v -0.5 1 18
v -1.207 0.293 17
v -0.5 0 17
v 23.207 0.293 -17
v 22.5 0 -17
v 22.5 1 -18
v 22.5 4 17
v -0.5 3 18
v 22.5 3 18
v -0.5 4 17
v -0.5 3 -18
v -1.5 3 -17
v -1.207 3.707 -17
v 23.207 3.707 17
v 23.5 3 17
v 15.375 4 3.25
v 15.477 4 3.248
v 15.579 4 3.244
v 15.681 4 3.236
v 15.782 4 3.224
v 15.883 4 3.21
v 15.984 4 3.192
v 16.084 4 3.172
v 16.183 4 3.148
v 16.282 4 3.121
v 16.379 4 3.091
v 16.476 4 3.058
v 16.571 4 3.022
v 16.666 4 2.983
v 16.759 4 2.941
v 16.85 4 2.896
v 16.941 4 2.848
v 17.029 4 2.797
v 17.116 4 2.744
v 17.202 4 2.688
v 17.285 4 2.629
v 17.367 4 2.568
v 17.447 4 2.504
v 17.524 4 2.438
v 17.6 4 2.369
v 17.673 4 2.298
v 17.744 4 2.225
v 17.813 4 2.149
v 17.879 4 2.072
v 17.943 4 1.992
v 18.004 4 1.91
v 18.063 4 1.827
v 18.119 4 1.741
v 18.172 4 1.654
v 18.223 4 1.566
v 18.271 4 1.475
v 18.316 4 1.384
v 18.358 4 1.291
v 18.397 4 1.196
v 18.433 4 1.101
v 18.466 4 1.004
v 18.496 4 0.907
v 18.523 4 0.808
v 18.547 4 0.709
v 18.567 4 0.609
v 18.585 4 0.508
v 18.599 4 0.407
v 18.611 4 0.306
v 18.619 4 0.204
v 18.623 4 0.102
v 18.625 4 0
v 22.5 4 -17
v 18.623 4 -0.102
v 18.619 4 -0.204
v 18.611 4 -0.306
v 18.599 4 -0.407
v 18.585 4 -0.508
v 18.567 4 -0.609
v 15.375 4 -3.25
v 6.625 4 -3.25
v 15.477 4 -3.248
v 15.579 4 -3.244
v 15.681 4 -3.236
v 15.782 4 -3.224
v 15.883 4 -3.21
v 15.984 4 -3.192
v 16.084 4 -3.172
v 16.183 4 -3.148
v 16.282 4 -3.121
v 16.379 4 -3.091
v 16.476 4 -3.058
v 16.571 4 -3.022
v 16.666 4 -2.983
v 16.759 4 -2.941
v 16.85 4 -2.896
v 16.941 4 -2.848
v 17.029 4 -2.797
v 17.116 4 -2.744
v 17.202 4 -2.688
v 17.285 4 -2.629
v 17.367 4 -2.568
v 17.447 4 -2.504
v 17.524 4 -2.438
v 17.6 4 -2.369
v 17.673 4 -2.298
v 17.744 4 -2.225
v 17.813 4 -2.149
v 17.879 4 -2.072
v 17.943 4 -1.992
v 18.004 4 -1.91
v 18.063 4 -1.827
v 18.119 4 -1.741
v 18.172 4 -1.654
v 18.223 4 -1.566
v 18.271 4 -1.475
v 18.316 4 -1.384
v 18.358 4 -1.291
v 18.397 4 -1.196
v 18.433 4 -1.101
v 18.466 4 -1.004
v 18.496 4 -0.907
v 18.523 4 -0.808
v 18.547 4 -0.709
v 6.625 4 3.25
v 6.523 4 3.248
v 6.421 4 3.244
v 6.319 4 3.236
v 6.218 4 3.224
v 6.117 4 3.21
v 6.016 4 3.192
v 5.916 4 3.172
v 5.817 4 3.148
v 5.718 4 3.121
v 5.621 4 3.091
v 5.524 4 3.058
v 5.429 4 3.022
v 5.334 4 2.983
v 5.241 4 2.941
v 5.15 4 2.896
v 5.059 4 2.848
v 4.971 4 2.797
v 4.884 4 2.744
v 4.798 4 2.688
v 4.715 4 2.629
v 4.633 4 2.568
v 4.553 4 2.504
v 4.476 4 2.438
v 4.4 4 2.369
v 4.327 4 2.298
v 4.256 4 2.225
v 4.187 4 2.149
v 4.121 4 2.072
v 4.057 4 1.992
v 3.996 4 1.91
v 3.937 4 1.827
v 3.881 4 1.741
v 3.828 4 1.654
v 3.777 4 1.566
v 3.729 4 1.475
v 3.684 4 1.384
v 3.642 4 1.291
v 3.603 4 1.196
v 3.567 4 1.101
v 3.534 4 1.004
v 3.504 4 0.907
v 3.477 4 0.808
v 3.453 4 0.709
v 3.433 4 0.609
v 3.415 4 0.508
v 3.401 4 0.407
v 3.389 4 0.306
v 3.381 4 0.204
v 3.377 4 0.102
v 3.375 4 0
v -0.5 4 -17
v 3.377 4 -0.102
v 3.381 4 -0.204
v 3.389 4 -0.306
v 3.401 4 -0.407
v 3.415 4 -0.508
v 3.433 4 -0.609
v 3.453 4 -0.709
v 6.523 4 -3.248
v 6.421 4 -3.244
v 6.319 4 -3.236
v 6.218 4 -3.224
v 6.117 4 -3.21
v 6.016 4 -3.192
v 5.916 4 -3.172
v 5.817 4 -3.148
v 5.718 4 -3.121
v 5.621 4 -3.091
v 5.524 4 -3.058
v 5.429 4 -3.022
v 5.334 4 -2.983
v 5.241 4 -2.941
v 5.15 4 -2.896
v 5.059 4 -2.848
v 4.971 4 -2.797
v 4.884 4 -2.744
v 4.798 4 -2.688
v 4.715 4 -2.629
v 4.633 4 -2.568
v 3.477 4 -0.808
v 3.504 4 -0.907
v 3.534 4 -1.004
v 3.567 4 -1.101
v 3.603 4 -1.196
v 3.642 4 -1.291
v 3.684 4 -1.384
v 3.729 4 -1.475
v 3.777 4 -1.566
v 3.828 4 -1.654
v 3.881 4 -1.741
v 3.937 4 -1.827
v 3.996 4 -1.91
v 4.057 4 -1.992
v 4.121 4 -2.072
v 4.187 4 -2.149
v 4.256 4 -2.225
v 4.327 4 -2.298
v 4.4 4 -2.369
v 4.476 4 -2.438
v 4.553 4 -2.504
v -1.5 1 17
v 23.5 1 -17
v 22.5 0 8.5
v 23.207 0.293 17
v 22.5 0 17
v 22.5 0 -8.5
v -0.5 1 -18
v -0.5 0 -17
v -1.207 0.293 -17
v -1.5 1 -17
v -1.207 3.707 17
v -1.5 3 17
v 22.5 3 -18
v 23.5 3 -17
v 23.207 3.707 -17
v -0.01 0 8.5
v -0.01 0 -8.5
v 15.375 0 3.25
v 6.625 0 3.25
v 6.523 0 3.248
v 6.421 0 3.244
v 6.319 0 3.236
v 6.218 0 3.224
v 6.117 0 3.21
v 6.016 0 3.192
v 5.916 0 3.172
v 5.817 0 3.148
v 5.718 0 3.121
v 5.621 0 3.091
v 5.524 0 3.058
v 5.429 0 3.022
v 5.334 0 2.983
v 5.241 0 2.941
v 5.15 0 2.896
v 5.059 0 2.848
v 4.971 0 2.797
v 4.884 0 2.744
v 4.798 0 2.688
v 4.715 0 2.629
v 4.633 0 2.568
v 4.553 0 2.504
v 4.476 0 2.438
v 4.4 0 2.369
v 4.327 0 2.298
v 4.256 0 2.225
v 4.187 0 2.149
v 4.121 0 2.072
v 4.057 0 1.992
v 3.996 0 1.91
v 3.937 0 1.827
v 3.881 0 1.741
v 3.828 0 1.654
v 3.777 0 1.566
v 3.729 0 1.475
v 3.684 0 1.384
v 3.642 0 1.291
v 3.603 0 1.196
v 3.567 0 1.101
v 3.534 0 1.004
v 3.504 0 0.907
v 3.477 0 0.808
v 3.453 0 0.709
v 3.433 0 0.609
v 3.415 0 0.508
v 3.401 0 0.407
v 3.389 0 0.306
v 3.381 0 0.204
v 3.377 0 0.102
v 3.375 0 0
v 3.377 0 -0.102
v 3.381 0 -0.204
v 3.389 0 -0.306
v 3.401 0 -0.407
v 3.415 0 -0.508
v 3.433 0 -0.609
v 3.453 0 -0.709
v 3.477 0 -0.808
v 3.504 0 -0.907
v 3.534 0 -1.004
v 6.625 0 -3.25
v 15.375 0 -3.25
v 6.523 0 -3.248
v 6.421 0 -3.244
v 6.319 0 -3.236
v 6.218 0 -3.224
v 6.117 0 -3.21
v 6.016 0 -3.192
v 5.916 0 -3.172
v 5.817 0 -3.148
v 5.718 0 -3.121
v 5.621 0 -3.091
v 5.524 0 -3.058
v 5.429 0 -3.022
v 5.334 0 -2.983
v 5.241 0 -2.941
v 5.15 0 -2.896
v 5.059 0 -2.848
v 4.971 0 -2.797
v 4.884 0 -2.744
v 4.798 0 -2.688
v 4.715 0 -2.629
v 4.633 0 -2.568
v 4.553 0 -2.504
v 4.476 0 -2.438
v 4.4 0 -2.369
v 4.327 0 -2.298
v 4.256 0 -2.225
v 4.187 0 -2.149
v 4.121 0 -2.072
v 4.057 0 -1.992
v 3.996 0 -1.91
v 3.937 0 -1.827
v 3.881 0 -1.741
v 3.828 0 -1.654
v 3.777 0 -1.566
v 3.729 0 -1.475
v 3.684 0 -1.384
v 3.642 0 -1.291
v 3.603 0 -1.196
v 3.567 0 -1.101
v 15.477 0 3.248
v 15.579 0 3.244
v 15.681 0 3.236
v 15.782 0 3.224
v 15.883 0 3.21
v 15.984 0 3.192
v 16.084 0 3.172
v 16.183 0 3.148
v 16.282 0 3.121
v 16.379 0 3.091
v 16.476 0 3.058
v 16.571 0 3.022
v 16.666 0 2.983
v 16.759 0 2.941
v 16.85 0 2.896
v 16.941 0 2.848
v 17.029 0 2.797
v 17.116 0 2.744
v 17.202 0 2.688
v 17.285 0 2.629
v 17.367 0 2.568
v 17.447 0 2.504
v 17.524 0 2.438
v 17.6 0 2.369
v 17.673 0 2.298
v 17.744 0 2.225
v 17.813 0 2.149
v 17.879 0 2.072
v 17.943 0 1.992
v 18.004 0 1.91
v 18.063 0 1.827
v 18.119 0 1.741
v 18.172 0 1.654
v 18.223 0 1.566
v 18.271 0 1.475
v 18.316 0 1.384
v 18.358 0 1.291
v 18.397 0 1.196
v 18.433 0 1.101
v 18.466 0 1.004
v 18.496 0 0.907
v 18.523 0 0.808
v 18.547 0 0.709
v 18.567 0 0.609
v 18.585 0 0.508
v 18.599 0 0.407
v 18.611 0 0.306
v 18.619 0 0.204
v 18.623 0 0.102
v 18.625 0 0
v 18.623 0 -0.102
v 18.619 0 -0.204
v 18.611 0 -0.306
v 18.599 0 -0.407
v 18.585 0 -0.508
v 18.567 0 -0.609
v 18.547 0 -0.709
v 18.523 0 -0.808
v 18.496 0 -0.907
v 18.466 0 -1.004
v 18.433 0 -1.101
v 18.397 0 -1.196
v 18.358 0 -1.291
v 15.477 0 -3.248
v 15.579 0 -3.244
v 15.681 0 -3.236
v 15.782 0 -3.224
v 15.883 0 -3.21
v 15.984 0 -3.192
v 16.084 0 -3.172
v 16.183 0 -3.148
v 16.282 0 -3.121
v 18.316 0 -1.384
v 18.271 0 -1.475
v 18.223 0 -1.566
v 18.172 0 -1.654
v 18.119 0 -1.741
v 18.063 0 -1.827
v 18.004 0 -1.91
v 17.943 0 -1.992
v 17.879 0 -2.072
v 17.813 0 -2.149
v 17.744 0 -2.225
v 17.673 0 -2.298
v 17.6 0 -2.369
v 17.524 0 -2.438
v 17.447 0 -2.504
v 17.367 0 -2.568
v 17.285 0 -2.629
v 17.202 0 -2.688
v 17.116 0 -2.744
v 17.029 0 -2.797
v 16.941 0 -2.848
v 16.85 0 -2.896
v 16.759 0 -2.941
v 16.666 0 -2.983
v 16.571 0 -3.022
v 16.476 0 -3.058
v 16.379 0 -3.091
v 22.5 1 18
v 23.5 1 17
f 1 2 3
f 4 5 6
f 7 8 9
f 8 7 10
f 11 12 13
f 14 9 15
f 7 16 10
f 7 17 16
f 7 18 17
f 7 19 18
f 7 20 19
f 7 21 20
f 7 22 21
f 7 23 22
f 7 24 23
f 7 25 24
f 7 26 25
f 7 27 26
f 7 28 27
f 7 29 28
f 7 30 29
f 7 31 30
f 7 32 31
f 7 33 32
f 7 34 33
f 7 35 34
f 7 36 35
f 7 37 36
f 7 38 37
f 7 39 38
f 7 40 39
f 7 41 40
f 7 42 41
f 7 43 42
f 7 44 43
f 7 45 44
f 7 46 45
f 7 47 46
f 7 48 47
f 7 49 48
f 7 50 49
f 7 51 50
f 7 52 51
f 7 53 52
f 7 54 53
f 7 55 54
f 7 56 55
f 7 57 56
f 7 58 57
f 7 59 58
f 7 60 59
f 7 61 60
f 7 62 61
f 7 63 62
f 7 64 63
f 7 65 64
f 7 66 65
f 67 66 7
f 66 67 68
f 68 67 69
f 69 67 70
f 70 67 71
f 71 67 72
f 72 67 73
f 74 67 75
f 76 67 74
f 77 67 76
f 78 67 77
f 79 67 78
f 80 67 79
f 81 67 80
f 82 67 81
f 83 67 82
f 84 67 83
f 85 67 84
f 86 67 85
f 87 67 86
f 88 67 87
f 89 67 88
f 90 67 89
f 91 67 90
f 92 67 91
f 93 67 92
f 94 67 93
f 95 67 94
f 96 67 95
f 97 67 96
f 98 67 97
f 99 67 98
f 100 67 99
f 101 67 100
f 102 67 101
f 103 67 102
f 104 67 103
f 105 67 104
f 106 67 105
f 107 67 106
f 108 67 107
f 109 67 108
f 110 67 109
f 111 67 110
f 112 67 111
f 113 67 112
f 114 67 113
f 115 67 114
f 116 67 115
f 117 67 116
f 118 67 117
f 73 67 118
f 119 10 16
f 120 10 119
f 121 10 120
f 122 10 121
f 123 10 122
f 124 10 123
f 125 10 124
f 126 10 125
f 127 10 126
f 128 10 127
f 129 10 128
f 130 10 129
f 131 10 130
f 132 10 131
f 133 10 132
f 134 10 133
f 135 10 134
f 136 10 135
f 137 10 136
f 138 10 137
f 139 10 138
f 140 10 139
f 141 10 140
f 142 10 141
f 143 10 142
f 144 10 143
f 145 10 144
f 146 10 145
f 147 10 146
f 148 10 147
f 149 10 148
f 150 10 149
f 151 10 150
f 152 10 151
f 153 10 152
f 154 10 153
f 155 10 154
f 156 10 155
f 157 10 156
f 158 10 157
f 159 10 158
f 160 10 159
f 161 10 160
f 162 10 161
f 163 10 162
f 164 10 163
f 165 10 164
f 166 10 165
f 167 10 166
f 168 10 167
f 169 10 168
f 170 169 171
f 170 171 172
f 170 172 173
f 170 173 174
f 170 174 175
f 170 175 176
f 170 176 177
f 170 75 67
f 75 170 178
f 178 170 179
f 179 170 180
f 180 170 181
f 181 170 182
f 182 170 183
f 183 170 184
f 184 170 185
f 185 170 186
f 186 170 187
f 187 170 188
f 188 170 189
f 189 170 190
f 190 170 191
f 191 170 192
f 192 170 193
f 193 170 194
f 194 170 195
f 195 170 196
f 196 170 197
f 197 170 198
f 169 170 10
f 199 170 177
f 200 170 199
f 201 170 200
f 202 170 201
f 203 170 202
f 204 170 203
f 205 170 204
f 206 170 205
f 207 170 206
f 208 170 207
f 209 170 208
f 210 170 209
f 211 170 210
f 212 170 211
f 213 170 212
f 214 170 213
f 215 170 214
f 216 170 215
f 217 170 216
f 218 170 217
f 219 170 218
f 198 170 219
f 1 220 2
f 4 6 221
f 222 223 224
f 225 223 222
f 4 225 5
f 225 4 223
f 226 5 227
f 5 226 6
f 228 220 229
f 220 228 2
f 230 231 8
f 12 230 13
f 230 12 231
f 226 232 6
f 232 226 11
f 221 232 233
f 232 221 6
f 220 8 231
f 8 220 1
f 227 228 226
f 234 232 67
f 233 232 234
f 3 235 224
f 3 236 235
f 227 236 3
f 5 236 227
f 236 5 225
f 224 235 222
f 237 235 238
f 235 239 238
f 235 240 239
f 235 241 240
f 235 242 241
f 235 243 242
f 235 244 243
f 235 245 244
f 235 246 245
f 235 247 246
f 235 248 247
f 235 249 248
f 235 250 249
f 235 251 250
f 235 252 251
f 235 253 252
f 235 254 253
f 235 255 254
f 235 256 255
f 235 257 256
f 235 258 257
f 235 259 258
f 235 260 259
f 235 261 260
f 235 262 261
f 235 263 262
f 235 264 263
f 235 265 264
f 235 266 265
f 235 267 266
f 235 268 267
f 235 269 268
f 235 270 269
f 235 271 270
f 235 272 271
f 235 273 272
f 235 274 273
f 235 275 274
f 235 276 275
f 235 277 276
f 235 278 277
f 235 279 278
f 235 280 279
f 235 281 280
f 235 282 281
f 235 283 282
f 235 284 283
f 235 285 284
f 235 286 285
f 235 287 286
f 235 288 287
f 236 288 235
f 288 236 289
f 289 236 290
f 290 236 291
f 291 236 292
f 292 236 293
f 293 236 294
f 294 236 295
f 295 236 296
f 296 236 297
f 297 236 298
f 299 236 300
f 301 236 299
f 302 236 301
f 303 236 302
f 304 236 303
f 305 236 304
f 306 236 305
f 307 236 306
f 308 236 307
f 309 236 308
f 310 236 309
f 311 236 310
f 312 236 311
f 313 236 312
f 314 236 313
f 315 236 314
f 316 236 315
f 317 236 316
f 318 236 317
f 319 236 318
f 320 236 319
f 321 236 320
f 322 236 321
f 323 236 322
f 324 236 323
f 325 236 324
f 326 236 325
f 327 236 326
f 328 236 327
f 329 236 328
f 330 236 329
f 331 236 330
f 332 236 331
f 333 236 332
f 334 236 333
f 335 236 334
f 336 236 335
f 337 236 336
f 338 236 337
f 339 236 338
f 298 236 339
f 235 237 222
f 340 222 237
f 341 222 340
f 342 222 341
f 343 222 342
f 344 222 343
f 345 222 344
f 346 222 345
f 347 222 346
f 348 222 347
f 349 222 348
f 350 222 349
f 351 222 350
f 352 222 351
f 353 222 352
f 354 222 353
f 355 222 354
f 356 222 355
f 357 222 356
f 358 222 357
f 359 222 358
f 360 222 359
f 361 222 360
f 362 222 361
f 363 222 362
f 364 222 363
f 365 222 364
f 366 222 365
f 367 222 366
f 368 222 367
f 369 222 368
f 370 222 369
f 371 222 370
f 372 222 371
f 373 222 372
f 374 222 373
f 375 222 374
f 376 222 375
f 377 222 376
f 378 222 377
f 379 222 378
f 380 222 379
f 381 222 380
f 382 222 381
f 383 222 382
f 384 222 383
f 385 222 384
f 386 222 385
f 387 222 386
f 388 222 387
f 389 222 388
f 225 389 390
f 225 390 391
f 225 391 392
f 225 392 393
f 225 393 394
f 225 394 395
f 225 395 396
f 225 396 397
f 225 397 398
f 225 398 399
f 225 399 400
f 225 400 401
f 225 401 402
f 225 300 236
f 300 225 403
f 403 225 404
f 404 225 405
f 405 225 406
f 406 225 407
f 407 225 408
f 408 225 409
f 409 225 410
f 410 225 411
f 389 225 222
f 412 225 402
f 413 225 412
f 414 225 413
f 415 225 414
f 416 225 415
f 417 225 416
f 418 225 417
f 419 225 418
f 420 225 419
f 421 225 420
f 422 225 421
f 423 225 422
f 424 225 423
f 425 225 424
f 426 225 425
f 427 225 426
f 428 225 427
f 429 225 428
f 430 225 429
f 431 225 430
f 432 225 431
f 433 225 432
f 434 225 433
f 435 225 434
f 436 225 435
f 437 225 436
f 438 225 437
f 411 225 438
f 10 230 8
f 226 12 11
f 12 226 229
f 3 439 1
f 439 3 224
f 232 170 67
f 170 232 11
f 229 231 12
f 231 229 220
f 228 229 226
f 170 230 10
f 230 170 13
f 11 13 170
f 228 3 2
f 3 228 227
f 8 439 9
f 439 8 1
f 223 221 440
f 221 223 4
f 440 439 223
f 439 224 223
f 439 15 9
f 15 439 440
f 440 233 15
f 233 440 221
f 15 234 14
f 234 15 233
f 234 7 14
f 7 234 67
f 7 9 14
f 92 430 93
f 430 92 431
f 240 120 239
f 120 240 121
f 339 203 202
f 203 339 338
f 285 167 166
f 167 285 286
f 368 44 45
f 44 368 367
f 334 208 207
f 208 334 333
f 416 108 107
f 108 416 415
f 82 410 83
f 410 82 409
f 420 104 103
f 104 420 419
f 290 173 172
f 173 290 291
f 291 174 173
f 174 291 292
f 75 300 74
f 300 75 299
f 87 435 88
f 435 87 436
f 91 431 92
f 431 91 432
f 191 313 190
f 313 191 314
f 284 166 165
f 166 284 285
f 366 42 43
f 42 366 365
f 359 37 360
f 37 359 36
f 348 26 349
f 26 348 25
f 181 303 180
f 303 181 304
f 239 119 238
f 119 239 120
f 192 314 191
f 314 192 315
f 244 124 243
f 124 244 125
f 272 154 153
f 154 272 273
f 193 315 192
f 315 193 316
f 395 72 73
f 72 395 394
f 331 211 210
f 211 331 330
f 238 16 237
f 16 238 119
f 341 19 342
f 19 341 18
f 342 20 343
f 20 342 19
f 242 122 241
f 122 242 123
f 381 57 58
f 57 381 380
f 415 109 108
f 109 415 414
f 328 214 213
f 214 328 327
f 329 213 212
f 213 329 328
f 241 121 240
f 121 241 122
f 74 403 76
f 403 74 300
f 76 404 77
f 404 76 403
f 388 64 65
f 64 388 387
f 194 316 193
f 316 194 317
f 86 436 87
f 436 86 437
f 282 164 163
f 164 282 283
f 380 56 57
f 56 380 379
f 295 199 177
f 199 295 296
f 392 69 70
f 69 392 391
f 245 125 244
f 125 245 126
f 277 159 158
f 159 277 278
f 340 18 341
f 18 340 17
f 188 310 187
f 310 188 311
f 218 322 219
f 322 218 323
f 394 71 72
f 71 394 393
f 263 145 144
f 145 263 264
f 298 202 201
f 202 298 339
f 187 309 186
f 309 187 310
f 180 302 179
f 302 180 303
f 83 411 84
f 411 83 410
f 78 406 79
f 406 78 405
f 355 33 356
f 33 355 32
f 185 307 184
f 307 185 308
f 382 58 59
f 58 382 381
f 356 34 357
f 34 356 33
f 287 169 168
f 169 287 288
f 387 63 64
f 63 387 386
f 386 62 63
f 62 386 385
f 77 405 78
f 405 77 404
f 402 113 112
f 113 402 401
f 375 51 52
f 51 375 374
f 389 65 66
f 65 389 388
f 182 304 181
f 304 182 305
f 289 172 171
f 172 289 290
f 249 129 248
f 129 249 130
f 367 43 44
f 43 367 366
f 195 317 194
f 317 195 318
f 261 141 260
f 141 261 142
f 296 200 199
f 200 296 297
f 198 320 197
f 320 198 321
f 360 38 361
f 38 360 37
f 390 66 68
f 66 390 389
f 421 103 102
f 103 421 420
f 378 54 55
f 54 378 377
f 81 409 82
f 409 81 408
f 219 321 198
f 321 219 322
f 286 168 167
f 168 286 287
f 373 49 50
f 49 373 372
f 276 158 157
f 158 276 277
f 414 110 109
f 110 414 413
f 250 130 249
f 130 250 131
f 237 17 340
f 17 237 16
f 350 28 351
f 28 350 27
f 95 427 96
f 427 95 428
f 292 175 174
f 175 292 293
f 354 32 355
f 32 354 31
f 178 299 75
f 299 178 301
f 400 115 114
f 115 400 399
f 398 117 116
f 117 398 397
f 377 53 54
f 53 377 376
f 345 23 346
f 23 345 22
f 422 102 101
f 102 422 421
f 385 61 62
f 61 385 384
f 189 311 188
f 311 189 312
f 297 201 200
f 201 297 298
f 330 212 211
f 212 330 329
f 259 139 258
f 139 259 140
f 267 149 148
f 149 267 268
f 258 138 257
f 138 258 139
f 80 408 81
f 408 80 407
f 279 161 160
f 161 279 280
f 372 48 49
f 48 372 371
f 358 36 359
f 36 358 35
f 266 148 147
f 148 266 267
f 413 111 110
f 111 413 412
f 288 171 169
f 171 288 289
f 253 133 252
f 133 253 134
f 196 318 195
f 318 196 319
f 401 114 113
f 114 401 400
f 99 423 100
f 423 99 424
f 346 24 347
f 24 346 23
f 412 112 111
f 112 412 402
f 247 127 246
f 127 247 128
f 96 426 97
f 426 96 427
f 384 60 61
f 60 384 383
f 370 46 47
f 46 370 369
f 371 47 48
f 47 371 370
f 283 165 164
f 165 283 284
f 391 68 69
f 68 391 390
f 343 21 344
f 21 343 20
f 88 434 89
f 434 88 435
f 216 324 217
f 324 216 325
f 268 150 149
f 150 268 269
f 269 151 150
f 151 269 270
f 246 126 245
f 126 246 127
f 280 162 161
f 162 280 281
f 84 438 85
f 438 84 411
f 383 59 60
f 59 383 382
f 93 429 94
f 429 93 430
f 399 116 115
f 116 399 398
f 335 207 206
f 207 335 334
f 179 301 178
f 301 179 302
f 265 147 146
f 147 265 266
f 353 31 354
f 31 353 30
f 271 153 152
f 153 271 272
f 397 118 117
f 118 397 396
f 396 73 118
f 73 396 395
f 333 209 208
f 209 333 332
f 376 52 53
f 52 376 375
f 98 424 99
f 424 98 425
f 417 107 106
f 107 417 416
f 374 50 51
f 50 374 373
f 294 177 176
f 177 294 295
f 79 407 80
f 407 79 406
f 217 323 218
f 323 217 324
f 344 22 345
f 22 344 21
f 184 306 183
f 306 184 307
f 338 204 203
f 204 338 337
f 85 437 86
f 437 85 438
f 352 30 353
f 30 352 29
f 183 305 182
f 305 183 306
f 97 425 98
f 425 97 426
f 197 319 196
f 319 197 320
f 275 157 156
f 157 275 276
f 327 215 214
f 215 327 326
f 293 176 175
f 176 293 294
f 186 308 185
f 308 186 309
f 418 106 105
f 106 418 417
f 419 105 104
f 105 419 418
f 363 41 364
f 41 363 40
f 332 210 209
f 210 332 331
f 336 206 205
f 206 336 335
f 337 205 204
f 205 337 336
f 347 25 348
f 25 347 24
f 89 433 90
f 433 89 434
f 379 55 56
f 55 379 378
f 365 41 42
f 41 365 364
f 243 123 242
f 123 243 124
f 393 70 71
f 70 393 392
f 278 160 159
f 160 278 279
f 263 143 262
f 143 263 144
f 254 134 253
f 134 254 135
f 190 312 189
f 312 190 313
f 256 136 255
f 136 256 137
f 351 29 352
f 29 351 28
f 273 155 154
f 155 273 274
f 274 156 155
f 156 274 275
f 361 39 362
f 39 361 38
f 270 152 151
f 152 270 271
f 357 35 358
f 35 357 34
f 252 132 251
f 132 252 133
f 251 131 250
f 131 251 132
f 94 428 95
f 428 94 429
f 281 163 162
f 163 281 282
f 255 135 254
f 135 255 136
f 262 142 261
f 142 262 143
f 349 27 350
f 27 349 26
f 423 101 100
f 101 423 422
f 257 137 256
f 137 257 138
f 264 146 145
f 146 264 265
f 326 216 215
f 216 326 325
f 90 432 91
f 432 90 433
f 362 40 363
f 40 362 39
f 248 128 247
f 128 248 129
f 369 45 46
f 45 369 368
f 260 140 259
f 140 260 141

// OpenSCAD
// file: ../chamferer.scad
INFINITY = 10000;
ATOM = .01;

module chamfer_tool(r, fn, tool,
                    ax, ay, az,
                    ax2, ay2, az2,
                    ax3, ay3, az3) {
    rotate([ax3, ay3, az3])
    rotate([ax2, ay2, az2])
    rotate([ax, ay, az]) {
        if (tool=="sphere") {
            sphere(r, $fn=fn);
        }
        else if (tool=="hemisphere-up") {
            intersection() {
                sphere(r, $fn=fn);
                cylinder(r=r*2, h=r*2);
            }
        }
        else if (tool=="hemisphere-down") {
            difference() {
                sphere(r, $fn=fn);
                cylinder(r=r*2, h=r*2);
            }
        }
        else if (tool=="cone") {
            cylinder(r, r, 0, $fn=fn);
            scale([1, 1, -1])
            cylinder(r, r, 0, $fn=fn);
        }
        else if (tool=="cone-up") {
            cylinder(r, r, 0, $fn=fn, center=true);
        }
        else if (tool=="cone-down") {
            scale([1, 1, -1])
            cylinder(r, r, 0, $fn=fn, center=true);
        }
        else if (tool=="octahedron") {
            resize([r*2, r*2, r*2]) {
                cylinder(r, r, 0, $fn=4);
                scale([1, 1, -1])
                cylinder(r, r, 0, $fn=4);
            }
        }
        else if (tool=="pyramid") {
            resize([r*2, r*2, r*2]) {
                cylinder(r, r, 0, center=true, $fn=4);
            }
        }
        else if (tool=="rpyramid") {
            resize([r*2, r*2, r*2]) {
                cylinder(r, 0, r, center=true, $fn=4);
            }
        }
        else if (tool=="cylinder-z" || tool=="cylinder") {
            cylinder(r=r, h=ATOM, $fn=fn, center=true);
        }
        else if (tool=="cylinder-x") {
            rotate([0, 90, 0])
            cylinder(r=r, h=ATOM, $fn=fn, center=true);
        }
        else if (tool=="cylinder-y") {
            rotate([90, 0, 0])
            cylinder(r=r, h=ATOM, $fn=fn, center=true);
        }
        else if (tool=="cube") {
            cube(r*2, center=true);
        }
        else if (tool=="plate-y") {
            cube([r*2, ATOM, r*2], center=true);
        }
        else if (tool=="plate-z") {
            cube([r*2, r*2, ATOM], center=true);
        }
        else {
            assert(false, str("Unknown tool: ", tool));
        }
    }
}

module shrinker(r, tool, fn,
                ax, ay, az,
                ax2, ay2, az2,
                ax3, ay3, az3) {
    if (!r) {
        children();
    }
    else {
        // re-invert+grow = fillet
        difference() {
            cube(INFINITY/2, center=true);

            // invert+grow = carve
            minkowski() {
                difference() {
                    cube(INFINITY, center=true);
                    children();
                }
                //cube(r, center=true);
                chamfer_tool(r, fn, tool,
                             ax, ay, az,
                             ax2, ay2, az2,
                             ax3, ay3, az3);
            }
        }
    }
}

module chamferer(r, tool="sphere", fn=8, shrink=true, grow=true,
                 ax=0, ay=0, az=0,
                 ax2=0, ay2=0, az2=0,
                 ax3=0, ay3=0, az3=0,
) {
    if (!r) {
        children();
    }
    else {
        minkowski() {
            if (shrink)
                shrinker(r, tool, fn,
                         ax, ay, az,
                         ax2, ay2, az2,
                         ax3, ay3, az3) children();
            else
                children();
            
            if (grow)
                chamfer_tool(r, fn, tool,
                             ax, ay, az,
                             ax2, ay2, az2,
                             ax3, ay3, az3);
        }
    }
}



cube(50);

translate([70, 0, 0])
chamferer(5, "hemisphere-up", $preview? 6*4 : 30)
//shrinker(5, "sphere", $preview? 6*4 : 30)
cube(50);

translate([70*2, 0, 0])
chamferer(5, "octahedron", grow=false)
cube(50);
// main file
use <../chamferer.scad>;

W = 36;
D = 6.5;
L = 25;
CH = 1;
TH = 4;

ATOM = .01;
$fn = 200;

difference() {
    chamferer($preview?0:CH, "cone") {
        // spring
        translate([0, 0, -W/2])
        linear_extrude(W)
        translate([-32, -287.5 +.07, 0])
        import("webcam-clip.dxf");

        // plate
        translate([-1.5, 0, -W/2])
        cube([L, TH, W]);
    }
    
    // screw passage
    hull() {
        translate([-1.5 + D*1.25, -.5, 0]) rotate([-90, 0, 0])
        cylinder(d=D, h=TH*5+1);

        translate([-1.5 + L - D*1.25, -.5, 0]) rotate([-90, 0, 0])
        cylinder(d=D, h=TH*5+1);
    }
    
    // screw head passage
    p = 15;
    h = 17;
    translate([-ATOM, -p, -h/2])
    cube([L*2, p, h]);
}
